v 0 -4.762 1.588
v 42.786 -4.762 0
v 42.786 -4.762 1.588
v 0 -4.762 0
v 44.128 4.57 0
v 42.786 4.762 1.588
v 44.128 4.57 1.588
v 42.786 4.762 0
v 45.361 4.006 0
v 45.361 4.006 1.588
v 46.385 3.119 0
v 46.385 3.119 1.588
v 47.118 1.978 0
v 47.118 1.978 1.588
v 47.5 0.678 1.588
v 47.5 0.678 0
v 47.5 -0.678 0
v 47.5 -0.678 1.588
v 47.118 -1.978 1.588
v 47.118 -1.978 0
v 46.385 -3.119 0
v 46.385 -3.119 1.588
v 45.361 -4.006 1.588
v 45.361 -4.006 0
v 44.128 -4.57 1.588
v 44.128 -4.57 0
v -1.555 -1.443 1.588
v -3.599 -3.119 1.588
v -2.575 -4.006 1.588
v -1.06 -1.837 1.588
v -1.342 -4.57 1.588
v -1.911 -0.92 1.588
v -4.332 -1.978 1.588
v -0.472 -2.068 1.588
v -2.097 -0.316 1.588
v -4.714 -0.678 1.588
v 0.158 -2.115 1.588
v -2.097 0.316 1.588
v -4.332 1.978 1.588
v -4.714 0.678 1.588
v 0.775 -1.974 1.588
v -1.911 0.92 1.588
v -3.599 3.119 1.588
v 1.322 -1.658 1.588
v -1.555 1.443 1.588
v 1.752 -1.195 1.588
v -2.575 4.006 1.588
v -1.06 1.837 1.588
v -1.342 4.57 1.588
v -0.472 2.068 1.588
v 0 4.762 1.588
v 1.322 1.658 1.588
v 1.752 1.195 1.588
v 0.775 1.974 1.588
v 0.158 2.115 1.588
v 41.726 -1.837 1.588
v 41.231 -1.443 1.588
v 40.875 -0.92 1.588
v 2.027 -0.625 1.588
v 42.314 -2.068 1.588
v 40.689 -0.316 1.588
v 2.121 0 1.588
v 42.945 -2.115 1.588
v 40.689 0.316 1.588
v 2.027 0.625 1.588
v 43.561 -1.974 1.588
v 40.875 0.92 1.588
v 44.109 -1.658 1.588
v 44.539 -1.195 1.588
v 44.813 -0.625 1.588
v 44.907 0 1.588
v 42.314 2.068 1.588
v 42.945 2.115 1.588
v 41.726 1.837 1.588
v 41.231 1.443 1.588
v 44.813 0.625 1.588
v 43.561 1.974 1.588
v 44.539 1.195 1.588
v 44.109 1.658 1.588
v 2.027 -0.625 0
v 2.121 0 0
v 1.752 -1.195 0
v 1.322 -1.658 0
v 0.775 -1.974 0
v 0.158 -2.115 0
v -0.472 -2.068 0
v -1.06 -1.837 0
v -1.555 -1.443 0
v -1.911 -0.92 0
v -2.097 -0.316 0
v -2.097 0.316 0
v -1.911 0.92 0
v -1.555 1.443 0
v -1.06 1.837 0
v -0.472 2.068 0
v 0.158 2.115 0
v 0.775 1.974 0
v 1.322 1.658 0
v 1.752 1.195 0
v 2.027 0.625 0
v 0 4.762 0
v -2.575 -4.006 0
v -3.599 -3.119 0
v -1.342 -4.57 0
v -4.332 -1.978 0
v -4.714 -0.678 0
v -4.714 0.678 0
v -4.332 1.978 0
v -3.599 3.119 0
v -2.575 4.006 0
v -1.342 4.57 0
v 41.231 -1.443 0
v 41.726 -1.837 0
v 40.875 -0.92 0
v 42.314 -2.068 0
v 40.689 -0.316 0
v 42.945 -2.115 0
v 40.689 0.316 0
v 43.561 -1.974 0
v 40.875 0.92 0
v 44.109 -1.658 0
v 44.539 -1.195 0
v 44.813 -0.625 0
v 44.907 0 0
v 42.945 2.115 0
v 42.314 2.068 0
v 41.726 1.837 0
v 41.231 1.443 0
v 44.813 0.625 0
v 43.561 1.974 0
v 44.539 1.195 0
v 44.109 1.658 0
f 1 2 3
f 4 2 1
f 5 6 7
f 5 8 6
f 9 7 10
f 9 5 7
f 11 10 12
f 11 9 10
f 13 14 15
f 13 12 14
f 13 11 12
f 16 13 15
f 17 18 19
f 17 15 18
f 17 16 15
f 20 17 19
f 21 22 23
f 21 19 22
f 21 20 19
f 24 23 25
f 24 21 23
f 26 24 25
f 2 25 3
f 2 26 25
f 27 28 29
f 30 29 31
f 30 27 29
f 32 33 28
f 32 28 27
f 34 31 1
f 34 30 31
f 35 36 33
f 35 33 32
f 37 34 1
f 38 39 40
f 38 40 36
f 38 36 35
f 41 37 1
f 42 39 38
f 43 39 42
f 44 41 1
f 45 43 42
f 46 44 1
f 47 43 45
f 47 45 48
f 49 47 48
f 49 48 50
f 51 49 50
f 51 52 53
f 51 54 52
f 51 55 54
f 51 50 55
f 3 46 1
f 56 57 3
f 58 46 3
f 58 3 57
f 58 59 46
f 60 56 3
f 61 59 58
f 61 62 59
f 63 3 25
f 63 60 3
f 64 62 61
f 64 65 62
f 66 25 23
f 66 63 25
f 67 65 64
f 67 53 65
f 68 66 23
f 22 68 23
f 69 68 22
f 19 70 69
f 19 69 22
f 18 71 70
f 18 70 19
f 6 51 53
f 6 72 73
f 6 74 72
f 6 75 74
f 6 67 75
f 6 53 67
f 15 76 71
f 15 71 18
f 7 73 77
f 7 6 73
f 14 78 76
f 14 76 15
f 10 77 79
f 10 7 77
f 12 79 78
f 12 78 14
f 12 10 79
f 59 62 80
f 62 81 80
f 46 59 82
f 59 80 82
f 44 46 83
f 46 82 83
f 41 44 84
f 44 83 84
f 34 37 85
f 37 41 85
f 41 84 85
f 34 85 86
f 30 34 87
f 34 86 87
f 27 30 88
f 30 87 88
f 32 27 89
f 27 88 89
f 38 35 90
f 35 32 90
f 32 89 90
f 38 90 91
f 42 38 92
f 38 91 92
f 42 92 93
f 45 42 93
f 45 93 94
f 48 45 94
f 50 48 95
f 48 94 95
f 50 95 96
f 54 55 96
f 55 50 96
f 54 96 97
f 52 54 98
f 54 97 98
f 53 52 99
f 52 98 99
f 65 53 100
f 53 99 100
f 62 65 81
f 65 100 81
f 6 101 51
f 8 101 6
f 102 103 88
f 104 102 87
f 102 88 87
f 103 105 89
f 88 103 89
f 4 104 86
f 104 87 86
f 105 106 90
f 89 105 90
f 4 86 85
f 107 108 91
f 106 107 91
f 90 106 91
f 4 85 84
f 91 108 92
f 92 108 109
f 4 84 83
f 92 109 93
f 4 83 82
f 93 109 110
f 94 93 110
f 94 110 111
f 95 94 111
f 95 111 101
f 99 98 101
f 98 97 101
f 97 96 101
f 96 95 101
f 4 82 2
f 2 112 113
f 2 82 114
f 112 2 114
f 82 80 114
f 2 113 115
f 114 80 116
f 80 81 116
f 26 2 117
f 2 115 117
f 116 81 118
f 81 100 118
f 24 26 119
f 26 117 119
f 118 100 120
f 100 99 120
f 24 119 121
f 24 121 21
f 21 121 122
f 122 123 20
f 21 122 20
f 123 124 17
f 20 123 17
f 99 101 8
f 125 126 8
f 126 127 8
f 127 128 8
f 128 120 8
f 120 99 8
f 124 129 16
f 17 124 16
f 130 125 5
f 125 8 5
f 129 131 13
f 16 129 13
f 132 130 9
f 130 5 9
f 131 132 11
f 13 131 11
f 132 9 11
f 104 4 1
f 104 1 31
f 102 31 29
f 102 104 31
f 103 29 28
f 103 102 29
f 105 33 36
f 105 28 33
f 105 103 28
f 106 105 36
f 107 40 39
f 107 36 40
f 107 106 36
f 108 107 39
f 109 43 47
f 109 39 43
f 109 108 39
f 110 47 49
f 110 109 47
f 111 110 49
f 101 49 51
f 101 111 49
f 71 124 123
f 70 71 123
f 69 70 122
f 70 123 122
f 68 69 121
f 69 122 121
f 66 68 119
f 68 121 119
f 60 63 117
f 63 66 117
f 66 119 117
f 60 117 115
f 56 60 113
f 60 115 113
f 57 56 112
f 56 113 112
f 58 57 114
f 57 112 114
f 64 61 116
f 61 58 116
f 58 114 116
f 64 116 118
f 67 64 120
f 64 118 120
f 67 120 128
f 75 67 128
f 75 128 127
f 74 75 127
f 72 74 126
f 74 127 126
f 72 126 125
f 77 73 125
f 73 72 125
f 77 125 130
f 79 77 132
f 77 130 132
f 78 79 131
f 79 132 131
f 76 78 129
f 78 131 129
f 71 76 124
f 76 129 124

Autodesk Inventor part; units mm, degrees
ref_plane "YZ Plane" through (0, 0, 0) normal (1, 0, 0) x (0, 1, 0)
ref_plane "XZ Plane" through (0, 0, 0) normal (0, 1, 0) x (-1, 0, 0)
ref_plane "XY Plane" through (0, 0, 0) normal (0, 0, 1) x (1, 0, 0)
sketch "Sketch1" plane through (0, 0, 0) normal (0, 0, 1) x (1, 0, 0)
  circle A0 centre (0, 0) radius 2.1209
  circle A1 centre (42.7862, 0) radius 2.1209
  arc A2 (0, 4.7625) -> (0, -4.7625) centre (0, 0) ccw
  arc A3 (42.7862, -4.7625) -> (42.7862, 4.7625) centre (42.7862, 0) ccw
  line L0 (0, 4.7625) -> (42.7862, 4.7625)
  line L1 (42.7862, -4.7625) -> (0, -4.7625)
  dimension "d0" = 4.2418
  dimension "d1" = 4.2418
extrude "Extrusion1" add sketch "Sketch1" along normal blind 1.5875
properties part number "joint_gusset" material "Acetal Resin, White"
